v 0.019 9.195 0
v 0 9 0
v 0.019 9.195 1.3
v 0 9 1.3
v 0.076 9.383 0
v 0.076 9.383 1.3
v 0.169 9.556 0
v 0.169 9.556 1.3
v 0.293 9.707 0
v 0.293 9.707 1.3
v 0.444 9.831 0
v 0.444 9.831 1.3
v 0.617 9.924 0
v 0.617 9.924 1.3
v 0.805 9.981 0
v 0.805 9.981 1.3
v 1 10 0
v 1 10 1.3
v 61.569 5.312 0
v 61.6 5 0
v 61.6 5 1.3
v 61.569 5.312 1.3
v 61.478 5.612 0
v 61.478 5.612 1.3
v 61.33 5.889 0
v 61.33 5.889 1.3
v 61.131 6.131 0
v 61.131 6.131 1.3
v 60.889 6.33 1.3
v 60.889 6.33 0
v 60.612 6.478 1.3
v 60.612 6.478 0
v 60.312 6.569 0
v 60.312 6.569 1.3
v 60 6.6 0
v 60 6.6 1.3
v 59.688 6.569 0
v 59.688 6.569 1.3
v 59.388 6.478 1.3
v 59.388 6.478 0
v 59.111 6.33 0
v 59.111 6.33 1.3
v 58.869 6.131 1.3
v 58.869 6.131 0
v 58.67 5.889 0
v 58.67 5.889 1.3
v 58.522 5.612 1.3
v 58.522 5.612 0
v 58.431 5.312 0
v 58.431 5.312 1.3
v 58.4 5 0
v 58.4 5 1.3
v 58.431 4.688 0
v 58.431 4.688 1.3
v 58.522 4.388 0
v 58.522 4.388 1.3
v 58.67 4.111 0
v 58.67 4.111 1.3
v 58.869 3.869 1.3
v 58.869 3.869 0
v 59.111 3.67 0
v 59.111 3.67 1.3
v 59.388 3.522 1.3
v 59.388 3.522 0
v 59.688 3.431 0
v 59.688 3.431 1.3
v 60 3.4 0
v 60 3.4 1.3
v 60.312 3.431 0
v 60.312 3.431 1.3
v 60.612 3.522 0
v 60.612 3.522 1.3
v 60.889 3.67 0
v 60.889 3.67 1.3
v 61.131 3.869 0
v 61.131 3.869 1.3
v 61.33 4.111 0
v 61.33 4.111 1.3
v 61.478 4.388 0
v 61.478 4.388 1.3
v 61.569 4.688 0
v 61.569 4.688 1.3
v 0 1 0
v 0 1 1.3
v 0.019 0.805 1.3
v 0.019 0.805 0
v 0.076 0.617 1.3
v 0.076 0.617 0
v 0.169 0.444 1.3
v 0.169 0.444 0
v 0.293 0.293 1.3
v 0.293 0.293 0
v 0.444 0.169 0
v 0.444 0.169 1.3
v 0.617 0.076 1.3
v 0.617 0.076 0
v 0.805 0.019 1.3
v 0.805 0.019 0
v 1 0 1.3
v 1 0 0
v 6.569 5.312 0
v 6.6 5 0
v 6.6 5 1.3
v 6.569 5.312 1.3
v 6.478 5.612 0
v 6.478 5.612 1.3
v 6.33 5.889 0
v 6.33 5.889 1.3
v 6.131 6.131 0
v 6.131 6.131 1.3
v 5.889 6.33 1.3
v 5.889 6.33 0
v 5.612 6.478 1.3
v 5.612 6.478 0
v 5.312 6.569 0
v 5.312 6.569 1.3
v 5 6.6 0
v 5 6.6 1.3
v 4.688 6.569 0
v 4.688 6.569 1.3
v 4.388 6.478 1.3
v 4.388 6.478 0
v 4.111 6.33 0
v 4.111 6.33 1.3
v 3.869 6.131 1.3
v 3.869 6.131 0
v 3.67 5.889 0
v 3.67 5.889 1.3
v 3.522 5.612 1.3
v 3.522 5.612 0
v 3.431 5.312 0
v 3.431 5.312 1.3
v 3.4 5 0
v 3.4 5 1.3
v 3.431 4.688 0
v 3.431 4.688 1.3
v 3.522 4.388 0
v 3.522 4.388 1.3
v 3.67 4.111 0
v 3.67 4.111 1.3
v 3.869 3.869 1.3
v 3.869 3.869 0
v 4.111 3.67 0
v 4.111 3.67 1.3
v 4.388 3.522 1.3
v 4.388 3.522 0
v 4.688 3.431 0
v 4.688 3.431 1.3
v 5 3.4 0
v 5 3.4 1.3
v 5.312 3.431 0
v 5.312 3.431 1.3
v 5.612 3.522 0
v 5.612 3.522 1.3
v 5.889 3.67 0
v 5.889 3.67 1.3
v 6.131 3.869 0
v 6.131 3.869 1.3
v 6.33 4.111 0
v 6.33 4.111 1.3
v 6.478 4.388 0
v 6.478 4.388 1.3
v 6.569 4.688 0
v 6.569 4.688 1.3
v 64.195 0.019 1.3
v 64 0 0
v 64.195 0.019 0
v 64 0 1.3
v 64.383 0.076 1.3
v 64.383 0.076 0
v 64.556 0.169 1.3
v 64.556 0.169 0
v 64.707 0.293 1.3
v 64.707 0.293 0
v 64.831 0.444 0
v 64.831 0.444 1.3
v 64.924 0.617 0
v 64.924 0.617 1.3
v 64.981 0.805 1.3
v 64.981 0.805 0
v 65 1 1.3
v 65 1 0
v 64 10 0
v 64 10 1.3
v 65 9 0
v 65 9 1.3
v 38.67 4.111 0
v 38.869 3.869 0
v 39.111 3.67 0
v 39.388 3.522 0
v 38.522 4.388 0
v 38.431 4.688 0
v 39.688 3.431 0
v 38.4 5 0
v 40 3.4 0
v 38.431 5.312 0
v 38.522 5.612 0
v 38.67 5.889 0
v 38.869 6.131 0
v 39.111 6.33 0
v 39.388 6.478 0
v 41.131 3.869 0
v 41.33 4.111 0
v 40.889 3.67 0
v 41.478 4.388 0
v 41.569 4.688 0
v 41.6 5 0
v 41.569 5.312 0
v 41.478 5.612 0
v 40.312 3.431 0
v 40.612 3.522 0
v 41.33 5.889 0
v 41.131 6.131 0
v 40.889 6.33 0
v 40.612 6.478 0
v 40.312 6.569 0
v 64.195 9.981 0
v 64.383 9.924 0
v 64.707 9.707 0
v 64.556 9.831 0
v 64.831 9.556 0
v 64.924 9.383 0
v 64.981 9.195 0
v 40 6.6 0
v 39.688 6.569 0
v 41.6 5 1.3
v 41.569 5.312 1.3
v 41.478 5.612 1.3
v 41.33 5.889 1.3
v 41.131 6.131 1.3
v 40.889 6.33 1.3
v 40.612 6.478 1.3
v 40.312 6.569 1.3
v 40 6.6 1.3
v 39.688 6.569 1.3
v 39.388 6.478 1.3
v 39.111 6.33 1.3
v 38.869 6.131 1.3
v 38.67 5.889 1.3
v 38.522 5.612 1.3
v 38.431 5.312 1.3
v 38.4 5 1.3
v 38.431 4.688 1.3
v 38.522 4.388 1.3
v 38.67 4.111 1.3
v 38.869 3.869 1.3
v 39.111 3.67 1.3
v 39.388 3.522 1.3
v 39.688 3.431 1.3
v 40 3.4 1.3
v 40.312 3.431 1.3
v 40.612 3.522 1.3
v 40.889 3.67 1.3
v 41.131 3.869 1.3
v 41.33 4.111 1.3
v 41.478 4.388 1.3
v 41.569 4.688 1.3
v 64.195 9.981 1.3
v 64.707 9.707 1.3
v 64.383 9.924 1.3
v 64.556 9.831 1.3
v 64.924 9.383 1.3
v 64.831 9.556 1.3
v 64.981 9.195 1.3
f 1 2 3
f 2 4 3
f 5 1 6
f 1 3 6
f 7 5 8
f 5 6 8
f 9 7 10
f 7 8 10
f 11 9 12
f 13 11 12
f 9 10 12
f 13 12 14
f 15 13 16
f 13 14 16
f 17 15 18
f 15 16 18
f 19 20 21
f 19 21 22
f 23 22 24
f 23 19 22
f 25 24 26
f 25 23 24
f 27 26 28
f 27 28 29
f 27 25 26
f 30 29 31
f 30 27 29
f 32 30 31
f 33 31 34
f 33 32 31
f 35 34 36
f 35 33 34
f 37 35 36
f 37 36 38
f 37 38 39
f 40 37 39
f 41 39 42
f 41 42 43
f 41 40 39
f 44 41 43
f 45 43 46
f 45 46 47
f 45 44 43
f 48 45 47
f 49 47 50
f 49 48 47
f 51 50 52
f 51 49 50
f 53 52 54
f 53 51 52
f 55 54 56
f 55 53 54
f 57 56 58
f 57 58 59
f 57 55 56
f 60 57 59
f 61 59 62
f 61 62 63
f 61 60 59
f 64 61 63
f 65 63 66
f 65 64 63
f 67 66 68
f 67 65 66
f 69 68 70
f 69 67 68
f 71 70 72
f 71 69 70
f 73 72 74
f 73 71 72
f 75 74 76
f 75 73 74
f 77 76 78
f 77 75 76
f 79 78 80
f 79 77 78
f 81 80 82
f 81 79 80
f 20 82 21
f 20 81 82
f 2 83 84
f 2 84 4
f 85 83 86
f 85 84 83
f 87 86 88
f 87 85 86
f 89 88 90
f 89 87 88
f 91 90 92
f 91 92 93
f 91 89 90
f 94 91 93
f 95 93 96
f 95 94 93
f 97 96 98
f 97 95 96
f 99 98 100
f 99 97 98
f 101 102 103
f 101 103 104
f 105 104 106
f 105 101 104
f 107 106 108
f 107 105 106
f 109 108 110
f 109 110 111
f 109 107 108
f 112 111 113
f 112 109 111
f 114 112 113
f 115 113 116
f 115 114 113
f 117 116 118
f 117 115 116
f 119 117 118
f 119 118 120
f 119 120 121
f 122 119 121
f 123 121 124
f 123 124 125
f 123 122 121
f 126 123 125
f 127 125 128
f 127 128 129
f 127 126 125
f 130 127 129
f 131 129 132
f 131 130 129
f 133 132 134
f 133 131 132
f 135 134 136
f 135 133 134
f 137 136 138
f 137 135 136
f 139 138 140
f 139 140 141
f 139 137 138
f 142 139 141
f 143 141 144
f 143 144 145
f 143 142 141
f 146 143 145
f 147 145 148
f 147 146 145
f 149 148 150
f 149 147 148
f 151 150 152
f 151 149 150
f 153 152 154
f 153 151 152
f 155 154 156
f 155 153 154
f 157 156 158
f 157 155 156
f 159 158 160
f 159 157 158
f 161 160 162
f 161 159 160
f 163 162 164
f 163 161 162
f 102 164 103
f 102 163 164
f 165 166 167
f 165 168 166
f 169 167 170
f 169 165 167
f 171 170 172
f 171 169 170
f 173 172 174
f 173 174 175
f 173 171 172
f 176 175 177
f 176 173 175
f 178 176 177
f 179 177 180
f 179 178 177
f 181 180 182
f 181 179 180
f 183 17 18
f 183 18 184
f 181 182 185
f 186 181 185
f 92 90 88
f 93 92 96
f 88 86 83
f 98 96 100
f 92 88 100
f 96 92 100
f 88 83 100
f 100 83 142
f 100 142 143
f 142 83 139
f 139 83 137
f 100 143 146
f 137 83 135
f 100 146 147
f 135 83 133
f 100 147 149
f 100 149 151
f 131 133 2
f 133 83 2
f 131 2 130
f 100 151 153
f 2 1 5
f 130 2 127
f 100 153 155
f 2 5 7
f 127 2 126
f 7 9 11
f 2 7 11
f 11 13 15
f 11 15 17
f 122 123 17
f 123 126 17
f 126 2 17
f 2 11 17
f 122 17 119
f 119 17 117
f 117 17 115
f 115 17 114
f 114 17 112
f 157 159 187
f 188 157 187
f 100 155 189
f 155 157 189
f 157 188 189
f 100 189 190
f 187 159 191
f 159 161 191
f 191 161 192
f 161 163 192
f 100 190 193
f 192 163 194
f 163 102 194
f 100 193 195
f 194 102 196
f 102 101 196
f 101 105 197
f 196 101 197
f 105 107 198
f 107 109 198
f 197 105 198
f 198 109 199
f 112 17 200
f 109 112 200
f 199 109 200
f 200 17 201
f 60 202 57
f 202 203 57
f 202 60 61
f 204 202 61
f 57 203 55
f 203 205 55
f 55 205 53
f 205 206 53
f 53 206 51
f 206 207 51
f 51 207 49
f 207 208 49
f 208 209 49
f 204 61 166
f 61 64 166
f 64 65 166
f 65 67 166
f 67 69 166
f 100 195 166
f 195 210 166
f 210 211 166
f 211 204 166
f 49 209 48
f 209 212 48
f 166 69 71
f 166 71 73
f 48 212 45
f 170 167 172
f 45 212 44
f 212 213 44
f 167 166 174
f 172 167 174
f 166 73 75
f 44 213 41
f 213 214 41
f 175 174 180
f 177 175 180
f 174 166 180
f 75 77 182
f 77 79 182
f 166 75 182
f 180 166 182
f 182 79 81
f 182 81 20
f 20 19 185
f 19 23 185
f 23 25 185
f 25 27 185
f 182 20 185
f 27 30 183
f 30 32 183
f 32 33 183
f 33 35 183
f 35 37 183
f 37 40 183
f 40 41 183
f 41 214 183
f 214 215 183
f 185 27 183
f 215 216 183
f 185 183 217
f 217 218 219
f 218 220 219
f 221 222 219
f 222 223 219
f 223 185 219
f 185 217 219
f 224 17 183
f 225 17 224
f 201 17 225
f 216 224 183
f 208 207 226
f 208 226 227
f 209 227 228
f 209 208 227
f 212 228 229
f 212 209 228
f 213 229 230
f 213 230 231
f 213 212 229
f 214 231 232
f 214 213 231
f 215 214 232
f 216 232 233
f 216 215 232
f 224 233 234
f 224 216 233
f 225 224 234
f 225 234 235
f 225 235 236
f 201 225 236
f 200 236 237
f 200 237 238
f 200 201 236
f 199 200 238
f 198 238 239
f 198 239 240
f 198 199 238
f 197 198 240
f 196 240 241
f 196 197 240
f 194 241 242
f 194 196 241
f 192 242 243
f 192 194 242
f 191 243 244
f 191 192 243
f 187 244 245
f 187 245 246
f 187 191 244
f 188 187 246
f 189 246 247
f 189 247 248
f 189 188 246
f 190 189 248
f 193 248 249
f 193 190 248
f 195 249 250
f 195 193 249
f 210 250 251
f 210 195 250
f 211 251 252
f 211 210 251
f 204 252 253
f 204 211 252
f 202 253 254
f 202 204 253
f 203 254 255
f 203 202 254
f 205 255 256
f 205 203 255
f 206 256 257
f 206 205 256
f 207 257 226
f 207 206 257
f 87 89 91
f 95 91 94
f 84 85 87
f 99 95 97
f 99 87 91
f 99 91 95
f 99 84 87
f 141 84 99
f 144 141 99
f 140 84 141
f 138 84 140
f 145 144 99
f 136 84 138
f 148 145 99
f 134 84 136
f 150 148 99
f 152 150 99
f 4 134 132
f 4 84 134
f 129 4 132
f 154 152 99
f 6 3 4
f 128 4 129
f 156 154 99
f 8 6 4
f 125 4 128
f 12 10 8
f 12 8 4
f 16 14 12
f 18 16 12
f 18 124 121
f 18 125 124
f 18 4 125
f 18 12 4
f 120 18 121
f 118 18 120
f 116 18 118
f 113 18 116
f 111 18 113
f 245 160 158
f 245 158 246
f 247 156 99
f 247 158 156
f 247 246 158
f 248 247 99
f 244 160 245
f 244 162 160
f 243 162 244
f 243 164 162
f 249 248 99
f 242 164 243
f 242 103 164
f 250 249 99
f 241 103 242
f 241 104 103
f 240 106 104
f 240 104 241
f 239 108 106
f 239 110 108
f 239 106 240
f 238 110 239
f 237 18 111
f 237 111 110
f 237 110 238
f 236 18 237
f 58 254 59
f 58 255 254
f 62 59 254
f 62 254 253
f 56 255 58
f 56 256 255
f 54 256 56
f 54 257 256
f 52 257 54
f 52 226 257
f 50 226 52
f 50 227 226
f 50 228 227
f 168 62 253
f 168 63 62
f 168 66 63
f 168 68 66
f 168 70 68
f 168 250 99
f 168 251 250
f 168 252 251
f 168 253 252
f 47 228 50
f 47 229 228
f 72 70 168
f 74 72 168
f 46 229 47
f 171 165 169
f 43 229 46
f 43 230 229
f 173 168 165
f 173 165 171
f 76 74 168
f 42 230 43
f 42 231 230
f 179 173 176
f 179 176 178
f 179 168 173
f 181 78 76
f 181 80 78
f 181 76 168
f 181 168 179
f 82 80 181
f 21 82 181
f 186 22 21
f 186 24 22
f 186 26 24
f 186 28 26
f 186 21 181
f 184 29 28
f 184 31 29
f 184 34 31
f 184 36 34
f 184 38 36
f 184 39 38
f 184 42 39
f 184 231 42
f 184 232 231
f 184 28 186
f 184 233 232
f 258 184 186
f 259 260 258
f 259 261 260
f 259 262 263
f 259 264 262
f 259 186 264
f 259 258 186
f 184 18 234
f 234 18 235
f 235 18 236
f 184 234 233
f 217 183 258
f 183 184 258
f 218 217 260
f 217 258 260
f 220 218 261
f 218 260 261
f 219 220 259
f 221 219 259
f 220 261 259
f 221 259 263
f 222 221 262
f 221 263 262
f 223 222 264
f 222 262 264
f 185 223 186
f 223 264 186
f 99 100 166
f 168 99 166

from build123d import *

# Parameters (mm, degrees)
SKETCH_1_W      = 65
SKETCH_1_H      = 10
SKETCH_1_R      = 1.6
EXTRUDE_1_DEPTH = 1.3
FILLET_1_R      = 1


with BuildPart() as part:
    # 草图1 → 凸台-拉伸1 (new body)
    with BuildSketch(Plane.XY):
        with Locations((32.5, 5)):
            Rectangle(SKETCH_1_W, SKETCH_1_H)
        with Locations((60, 5)):
            Circle(SKETCH_1_R, mode=Mode.SUBTRACT)
        with Locations((40, 5)):
            Circle(SKETCH_1_R, mode=Mode.SUBTRACT)
        with Locations((5, 5)):
            Circle(SKETCH_1_R, mode=Mode.SUBTRACT)
    extrude(amount=EXTRUDE_1_DEPTH)

    # 圆角1
    fillet_1_edges = [part.edges().sort_by_distance(p)[0] for p in [
        (0, 10, 0.65),
        (65, 10, 0.65),
        (65, 0, 0.65),
        (0, 0, 0.65),
    ]]
    fillet(fillet_1_edges, radius=FILLET_1_R)


solid = part.part
